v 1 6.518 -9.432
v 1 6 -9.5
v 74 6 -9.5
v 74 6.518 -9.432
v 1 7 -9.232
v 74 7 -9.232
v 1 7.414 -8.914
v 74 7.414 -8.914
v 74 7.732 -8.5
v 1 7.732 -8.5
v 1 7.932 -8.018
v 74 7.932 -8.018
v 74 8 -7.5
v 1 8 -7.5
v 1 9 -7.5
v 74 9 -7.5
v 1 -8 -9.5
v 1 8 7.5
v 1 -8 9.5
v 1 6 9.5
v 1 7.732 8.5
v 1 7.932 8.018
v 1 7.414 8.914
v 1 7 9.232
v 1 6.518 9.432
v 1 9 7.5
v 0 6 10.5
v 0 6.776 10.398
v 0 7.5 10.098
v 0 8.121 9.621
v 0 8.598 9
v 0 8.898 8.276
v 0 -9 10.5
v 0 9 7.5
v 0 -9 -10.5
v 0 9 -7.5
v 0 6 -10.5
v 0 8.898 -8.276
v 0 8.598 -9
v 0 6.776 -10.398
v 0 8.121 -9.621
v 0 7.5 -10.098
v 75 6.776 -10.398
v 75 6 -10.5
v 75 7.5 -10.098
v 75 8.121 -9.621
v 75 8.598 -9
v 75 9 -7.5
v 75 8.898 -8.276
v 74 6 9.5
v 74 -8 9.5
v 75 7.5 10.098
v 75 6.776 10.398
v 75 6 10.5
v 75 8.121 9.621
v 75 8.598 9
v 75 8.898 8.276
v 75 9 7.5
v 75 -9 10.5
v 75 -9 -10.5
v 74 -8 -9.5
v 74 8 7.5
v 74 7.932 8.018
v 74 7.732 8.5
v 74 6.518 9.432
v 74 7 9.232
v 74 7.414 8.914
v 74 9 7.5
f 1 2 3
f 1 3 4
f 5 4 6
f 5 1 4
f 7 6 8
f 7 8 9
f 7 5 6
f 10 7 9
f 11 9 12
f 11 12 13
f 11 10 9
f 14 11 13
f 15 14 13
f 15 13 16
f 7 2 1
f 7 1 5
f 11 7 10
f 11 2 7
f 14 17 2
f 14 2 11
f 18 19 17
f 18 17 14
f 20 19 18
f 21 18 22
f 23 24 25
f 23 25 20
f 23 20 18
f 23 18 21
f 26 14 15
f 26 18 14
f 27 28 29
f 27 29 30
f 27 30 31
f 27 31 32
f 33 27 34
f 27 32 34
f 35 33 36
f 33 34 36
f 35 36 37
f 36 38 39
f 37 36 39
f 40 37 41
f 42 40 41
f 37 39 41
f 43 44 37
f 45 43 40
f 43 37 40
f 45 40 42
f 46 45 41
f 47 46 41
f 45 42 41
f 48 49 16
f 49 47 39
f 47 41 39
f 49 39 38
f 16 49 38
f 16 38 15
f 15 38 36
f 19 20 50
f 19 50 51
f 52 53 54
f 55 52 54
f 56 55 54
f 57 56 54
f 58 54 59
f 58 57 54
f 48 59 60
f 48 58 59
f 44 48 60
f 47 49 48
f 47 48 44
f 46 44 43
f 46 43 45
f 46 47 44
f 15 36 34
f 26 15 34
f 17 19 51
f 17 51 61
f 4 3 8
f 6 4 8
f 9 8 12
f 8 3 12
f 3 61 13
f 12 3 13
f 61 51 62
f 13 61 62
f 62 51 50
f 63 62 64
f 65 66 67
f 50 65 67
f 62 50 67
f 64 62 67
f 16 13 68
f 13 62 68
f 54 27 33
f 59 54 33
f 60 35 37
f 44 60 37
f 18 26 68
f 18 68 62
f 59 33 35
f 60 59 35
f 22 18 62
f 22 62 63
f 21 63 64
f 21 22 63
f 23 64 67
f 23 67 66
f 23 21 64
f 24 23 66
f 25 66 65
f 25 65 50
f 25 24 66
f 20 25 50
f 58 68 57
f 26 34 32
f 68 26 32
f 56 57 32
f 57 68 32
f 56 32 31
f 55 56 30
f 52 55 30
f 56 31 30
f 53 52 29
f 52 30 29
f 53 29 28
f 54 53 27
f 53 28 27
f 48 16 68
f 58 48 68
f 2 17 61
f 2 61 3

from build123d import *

# Parameters (mm, degrees)
BOSS_EXTRUDE1_DEPTH = 75
SHELL1_START        = 1
SHELL1_DEPTH        = 73


# Read off the part's stored shape, not the designer's step: Shell1
with BuildPart() as part:
    # Sketch2 → Boss-Extrude1 (new body)
    with BuildSketch(Plane(origin=(0, 0, 0), x_dir=(0, 0, -1), z_dir=(1, 0, 0))):
        with BuildLine():
            Line((-10.5, -9), (10.5, -9))
            Line((10.5, -9), (10.5, 6))
            ThreePointArc((10.5, 6), (9.621320344, 8.121320344), (7.5, 9))
            Line((7.5, 9), (-7.5, 9))
            ThreePointArc((-7.5, 9), (-9.621320344, 8.121320344), (-10.5, 6))
            Line((-10.5, 6), (-10.5, -9))
        make_face()
    extrude(amount=BOSS_EXTRUDE1_DEPTH)

    # Shell1 outline → Shell1 (cut)
    with BuildSketch(Plane.YZ.offset(SHELL1_START)):
        with BuildLine():
            Line((8, -7.5), (9, -7.5))
            Line((9, -7.5), (9, 7.5))
            Line((9, 7.5), (8, 7.5))
            ThreePointArc((8, 7.5), (7.414213562, 8.914213562), (6, 9.5))
            Line((6, 9.5), (-8, 9.5))
            Line((-8, 9.5), (-8, -9.5))
            Line((-8, -9.5), (6, -9.5))
            ThreePointArc((6, -9.5), (7.414213562, -8.914213562), (8, -7.5))
        make_face()
    extrude(amount=SHELL1_DEPTH, mode=Mode.SUBTRACT)


solid = part.part
